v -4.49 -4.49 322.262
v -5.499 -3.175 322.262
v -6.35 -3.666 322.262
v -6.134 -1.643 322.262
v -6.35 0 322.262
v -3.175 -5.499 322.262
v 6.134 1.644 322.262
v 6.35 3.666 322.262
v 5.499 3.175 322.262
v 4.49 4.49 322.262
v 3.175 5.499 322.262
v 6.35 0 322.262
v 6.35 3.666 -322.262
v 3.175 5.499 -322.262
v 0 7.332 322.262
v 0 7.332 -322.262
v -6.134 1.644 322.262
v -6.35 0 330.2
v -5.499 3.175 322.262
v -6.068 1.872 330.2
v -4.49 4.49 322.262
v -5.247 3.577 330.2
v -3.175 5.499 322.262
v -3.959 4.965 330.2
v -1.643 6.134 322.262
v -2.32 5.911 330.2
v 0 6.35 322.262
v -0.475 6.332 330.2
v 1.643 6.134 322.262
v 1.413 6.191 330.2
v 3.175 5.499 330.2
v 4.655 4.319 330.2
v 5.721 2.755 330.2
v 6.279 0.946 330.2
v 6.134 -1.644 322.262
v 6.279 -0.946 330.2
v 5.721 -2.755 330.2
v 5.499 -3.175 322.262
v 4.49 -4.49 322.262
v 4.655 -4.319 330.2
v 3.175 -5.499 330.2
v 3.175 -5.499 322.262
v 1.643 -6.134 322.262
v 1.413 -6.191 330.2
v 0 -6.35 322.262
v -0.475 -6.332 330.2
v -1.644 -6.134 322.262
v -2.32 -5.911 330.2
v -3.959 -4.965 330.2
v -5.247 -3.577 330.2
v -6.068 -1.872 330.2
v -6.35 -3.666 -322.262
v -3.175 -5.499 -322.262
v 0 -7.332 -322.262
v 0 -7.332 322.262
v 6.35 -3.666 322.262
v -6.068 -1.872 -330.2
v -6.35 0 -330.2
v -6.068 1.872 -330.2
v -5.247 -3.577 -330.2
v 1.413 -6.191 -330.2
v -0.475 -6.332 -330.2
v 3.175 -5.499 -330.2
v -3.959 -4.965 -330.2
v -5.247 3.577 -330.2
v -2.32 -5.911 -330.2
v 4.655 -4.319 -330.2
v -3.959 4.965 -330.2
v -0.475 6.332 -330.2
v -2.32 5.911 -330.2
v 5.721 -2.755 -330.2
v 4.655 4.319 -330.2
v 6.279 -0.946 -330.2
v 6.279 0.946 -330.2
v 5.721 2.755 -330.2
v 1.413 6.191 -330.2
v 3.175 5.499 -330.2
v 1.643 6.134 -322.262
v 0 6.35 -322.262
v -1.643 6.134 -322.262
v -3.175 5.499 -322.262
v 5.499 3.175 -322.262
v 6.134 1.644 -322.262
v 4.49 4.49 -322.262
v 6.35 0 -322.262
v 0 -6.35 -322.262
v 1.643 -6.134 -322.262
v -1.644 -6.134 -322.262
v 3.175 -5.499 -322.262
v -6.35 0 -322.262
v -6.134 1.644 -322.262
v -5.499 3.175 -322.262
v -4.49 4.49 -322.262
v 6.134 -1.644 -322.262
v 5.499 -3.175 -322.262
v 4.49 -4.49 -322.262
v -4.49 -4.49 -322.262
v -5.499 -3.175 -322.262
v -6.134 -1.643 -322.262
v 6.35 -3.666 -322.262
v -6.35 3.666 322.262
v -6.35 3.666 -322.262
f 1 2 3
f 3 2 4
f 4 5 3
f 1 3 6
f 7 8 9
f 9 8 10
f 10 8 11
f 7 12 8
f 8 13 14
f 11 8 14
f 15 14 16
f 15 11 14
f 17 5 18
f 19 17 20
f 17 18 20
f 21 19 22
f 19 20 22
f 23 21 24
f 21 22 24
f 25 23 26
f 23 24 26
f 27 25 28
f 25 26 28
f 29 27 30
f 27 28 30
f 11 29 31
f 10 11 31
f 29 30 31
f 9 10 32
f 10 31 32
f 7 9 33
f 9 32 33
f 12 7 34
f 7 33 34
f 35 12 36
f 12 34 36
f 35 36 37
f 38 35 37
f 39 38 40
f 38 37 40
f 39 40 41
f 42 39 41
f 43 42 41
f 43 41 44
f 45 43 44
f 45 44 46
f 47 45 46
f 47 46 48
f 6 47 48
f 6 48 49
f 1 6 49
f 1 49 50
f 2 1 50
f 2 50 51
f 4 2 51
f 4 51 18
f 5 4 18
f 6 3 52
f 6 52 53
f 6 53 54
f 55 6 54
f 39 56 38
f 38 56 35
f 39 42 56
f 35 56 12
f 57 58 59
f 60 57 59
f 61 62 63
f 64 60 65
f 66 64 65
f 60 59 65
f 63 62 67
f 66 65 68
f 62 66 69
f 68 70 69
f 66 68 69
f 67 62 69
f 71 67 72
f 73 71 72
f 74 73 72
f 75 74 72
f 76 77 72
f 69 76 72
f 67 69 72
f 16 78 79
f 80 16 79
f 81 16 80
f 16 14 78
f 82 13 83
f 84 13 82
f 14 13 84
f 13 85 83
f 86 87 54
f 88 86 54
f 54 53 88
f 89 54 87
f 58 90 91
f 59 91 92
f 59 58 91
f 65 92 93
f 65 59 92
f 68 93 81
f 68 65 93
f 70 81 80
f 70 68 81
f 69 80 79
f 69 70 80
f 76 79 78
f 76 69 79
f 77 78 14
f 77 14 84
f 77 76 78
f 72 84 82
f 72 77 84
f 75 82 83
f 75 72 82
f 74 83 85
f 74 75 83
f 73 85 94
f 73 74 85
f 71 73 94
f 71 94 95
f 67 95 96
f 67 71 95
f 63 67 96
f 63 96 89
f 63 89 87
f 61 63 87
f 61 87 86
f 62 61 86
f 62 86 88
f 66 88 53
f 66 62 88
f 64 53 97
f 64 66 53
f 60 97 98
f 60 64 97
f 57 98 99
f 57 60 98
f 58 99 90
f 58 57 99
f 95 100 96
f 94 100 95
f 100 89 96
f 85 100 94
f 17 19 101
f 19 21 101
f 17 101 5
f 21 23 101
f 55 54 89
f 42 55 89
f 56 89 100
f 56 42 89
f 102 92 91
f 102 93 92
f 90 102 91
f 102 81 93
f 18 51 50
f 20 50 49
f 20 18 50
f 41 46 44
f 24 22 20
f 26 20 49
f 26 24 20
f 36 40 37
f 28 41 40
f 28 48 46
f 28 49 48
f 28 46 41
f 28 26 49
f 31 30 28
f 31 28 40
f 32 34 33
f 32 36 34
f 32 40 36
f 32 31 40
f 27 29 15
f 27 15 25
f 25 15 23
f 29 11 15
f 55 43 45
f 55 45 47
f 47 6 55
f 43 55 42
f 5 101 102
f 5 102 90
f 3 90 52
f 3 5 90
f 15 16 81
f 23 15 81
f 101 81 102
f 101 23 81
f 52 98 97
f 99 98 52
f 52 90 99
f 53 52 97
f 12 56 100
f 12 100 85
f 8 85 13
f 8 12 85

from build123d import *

# Parameters (mm, degrees)
BOSS_EXTRUDE1_DEPTH     = 330.2
SKETCH2_R               = 8.89
SKETCH2_R_2             = 6.35
CUT_EXTRUDE_THIN1_DEPTH = 7.9375


with BuildPart() as part:
    # Sketch1 → Boss-Extrude1 (new, symmetric)
    with BuildSketch(Plane.XY):
        Polygon((0, 7.332348419), (-6.35, 3.666174209), (-6.35, -3.666174209), (0, -7.332348419), (6.35, -3.666174209), (6.35, 3.666174209), align=None)
    extrude(amount=BOSS_EXTRUDE1_DEPTH, both=True)

    # Sketch2 → Cut-Extrude-Thin1 (cut)
    with BuildSketch(Plane(origin=(0, 0, -330.2), x_dir=(-1, 0, 0), z_dir=(0, 0, -1))):
        Circle(SKETCH2_R)
        Circle(SKETCH2_R_2, mode=Mode.SUBTRACT)
    cut_extrude_thin1 = extrude(amount=-CUT_EXTRUDE_THIN1_DEPTH, mode=Mode.SUBTRACT)

    # Mirror1: Cut-Extrude-Thin1 across plane
    add(cut_extrude_thin1.mirror(Plane.XY), mode=Mode.SUBTRACT)


solid = part.part
